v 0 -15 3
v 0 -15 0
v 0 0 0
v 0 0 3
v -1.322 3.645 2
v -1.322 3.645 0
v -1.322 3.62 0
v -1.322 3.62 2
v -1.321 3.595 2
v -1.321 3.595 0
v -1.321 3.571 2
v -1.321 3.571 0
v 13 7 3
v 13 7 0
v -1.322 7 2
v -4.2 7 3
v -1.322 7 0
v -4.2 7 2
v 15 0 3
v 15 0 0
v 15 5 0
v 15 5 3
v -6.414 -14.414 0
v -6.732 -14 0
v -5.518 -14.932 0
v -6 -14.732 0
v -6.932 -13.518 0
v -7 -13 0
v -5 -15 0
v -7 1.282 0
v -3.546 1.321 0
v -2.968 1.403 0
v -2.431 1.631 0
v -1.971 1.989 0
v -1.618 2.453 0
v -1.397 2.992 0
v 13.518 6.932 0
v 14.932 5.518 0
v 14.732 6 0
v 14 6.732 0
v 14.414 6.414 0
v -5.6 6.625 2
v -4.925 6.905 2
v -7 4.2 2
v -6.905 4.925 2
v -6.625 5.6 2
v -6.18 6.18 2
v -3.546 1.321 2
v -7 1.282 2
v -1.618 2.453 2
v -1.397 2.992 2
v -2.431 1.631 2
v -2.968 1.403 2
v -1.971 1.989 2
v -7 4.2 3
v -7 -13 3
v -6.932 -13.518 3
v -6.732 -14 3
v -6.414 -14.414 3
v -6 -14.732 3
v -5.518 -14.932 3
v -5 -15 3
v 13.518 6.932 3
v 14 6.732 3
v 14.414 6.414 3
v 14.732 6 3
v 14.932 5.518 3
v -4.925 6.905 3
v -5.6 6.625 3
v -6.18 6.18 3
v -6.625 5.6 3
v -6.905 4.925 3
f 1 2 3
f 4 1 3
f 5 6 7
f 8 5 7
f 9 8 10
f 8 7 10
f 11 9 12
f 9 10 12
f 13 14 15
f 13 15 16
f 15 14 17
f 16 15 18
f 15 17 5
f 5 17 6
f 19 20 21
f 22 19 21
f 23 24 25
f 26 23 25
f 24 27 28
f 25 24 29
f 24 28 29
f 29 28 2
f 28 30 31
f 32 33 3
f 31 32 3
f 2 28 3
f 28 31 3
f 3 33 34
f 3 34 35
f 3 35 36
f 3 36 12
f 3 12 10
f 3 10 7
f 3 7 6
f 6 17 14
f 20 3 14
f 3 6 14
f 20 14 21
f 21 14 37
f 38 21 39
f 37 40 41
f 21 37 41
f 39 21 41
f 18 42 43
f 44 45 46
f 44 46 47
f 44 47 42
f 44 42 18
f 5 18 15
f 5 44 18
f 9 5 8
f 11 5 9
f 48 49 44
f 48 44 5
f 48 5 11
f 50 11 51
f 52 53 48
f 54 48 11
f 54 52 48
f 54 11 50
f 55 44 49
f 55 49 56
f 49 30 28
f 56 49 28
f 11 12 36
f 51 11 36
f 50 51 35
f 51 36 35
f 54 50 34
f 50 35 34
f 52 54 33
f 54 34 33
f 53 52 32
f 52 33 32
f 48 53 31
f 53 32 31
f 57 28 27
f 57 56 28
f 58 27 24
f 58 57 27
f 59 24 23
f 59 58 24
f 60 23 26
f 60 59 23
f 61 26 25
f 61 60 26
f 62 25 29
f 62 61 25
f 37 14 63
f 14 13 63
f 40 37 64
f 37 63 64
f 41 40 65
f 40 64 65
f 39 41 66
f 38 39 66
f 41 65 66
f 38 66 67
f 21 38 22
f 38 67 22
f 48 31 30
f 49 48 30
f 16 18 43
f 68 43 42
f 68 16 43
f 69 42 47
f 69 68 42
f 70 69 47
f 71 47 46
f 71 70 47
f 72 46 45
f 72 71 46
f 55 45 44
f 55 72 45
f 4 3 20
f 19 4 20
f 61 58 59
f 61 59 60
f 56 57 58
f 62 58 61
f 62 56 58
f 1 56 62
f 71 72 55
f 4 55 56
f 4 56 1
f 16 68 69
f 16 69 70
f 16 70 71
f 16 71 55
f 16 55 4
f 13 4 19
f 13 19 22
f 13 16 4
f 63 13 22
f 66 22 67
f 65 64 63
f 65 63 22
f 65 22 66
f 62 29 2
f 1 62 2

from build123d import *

# Parameters (mm, degrees)
F1_DEPTH = 3
F2_R     = 2.8
F3_R     = 2
F5_DEPTH = 2


with BuildPart() as f1:
    # F0 (on Top) → F1 (new body)
    with BuildSketch(Plane.XY):
        Polygon((0, -15), (0, 0), (15, 0), (15, 7), (-7, 7), (-7, -15), align=None)
    extrude(amount=F1_DEPTH)

    # F2
    f2_edges = [f1.edges().sort_by_distance(p)[0] for p in [
        (-7, 7, 1.5),
    ]]
    fillet(f2_edges, radius=F2_R)

    # F3
    f3_edges = [f1.edges().sort_by_distance(p)[0] for p in [
        (15, 7, 1.5),
        (-7, -15, 1.5),
    ]]
    fillet(f3_edges, radius=F3_R)

    # F4 (on face) → F5 (cut)
    with BuildSketch(Plane(origin=(0, 0, 0), x_dir=(1, 0, 0), z_dir=(0, 0, -1))):
        with BuildLine():
            ThreePointArc((-1.322323, -3.644969), (-1.321403, -3.60783), (-1.321097, -3.570682))
            ThreePointArc((-1.321097, -3.570682), (-1.971123, -1.988726), (-3.545615, -1.320826))
            ThreePointArc((-3.545615, -1.320826), (-5.196971, -5.126005), (-1.322323, -3.644969))
        make_face()
        with BuildLine():
            ThreePointArc((-1.322323, -3.644969), (-5.196971, -5.126005), (-3.545615, -1.320826))
            Line((-3.545615, -1.320826), (-7, -1.281702))
            Line((-7, -1.281702), (-7, -4.2))
            ThreePointArc((-7, -4.2), (-6.179899, -6.179899), (-4.2, -7))
            Line((-4.2, -7), (-1.322323, -7))
            Line((-1.322323, -7), (-1.322323, -3.644969))
        make_face()
    extrude(amount=-F5_DEPTH, mode=Mode.SUBTRACT)


solid = f1.part
